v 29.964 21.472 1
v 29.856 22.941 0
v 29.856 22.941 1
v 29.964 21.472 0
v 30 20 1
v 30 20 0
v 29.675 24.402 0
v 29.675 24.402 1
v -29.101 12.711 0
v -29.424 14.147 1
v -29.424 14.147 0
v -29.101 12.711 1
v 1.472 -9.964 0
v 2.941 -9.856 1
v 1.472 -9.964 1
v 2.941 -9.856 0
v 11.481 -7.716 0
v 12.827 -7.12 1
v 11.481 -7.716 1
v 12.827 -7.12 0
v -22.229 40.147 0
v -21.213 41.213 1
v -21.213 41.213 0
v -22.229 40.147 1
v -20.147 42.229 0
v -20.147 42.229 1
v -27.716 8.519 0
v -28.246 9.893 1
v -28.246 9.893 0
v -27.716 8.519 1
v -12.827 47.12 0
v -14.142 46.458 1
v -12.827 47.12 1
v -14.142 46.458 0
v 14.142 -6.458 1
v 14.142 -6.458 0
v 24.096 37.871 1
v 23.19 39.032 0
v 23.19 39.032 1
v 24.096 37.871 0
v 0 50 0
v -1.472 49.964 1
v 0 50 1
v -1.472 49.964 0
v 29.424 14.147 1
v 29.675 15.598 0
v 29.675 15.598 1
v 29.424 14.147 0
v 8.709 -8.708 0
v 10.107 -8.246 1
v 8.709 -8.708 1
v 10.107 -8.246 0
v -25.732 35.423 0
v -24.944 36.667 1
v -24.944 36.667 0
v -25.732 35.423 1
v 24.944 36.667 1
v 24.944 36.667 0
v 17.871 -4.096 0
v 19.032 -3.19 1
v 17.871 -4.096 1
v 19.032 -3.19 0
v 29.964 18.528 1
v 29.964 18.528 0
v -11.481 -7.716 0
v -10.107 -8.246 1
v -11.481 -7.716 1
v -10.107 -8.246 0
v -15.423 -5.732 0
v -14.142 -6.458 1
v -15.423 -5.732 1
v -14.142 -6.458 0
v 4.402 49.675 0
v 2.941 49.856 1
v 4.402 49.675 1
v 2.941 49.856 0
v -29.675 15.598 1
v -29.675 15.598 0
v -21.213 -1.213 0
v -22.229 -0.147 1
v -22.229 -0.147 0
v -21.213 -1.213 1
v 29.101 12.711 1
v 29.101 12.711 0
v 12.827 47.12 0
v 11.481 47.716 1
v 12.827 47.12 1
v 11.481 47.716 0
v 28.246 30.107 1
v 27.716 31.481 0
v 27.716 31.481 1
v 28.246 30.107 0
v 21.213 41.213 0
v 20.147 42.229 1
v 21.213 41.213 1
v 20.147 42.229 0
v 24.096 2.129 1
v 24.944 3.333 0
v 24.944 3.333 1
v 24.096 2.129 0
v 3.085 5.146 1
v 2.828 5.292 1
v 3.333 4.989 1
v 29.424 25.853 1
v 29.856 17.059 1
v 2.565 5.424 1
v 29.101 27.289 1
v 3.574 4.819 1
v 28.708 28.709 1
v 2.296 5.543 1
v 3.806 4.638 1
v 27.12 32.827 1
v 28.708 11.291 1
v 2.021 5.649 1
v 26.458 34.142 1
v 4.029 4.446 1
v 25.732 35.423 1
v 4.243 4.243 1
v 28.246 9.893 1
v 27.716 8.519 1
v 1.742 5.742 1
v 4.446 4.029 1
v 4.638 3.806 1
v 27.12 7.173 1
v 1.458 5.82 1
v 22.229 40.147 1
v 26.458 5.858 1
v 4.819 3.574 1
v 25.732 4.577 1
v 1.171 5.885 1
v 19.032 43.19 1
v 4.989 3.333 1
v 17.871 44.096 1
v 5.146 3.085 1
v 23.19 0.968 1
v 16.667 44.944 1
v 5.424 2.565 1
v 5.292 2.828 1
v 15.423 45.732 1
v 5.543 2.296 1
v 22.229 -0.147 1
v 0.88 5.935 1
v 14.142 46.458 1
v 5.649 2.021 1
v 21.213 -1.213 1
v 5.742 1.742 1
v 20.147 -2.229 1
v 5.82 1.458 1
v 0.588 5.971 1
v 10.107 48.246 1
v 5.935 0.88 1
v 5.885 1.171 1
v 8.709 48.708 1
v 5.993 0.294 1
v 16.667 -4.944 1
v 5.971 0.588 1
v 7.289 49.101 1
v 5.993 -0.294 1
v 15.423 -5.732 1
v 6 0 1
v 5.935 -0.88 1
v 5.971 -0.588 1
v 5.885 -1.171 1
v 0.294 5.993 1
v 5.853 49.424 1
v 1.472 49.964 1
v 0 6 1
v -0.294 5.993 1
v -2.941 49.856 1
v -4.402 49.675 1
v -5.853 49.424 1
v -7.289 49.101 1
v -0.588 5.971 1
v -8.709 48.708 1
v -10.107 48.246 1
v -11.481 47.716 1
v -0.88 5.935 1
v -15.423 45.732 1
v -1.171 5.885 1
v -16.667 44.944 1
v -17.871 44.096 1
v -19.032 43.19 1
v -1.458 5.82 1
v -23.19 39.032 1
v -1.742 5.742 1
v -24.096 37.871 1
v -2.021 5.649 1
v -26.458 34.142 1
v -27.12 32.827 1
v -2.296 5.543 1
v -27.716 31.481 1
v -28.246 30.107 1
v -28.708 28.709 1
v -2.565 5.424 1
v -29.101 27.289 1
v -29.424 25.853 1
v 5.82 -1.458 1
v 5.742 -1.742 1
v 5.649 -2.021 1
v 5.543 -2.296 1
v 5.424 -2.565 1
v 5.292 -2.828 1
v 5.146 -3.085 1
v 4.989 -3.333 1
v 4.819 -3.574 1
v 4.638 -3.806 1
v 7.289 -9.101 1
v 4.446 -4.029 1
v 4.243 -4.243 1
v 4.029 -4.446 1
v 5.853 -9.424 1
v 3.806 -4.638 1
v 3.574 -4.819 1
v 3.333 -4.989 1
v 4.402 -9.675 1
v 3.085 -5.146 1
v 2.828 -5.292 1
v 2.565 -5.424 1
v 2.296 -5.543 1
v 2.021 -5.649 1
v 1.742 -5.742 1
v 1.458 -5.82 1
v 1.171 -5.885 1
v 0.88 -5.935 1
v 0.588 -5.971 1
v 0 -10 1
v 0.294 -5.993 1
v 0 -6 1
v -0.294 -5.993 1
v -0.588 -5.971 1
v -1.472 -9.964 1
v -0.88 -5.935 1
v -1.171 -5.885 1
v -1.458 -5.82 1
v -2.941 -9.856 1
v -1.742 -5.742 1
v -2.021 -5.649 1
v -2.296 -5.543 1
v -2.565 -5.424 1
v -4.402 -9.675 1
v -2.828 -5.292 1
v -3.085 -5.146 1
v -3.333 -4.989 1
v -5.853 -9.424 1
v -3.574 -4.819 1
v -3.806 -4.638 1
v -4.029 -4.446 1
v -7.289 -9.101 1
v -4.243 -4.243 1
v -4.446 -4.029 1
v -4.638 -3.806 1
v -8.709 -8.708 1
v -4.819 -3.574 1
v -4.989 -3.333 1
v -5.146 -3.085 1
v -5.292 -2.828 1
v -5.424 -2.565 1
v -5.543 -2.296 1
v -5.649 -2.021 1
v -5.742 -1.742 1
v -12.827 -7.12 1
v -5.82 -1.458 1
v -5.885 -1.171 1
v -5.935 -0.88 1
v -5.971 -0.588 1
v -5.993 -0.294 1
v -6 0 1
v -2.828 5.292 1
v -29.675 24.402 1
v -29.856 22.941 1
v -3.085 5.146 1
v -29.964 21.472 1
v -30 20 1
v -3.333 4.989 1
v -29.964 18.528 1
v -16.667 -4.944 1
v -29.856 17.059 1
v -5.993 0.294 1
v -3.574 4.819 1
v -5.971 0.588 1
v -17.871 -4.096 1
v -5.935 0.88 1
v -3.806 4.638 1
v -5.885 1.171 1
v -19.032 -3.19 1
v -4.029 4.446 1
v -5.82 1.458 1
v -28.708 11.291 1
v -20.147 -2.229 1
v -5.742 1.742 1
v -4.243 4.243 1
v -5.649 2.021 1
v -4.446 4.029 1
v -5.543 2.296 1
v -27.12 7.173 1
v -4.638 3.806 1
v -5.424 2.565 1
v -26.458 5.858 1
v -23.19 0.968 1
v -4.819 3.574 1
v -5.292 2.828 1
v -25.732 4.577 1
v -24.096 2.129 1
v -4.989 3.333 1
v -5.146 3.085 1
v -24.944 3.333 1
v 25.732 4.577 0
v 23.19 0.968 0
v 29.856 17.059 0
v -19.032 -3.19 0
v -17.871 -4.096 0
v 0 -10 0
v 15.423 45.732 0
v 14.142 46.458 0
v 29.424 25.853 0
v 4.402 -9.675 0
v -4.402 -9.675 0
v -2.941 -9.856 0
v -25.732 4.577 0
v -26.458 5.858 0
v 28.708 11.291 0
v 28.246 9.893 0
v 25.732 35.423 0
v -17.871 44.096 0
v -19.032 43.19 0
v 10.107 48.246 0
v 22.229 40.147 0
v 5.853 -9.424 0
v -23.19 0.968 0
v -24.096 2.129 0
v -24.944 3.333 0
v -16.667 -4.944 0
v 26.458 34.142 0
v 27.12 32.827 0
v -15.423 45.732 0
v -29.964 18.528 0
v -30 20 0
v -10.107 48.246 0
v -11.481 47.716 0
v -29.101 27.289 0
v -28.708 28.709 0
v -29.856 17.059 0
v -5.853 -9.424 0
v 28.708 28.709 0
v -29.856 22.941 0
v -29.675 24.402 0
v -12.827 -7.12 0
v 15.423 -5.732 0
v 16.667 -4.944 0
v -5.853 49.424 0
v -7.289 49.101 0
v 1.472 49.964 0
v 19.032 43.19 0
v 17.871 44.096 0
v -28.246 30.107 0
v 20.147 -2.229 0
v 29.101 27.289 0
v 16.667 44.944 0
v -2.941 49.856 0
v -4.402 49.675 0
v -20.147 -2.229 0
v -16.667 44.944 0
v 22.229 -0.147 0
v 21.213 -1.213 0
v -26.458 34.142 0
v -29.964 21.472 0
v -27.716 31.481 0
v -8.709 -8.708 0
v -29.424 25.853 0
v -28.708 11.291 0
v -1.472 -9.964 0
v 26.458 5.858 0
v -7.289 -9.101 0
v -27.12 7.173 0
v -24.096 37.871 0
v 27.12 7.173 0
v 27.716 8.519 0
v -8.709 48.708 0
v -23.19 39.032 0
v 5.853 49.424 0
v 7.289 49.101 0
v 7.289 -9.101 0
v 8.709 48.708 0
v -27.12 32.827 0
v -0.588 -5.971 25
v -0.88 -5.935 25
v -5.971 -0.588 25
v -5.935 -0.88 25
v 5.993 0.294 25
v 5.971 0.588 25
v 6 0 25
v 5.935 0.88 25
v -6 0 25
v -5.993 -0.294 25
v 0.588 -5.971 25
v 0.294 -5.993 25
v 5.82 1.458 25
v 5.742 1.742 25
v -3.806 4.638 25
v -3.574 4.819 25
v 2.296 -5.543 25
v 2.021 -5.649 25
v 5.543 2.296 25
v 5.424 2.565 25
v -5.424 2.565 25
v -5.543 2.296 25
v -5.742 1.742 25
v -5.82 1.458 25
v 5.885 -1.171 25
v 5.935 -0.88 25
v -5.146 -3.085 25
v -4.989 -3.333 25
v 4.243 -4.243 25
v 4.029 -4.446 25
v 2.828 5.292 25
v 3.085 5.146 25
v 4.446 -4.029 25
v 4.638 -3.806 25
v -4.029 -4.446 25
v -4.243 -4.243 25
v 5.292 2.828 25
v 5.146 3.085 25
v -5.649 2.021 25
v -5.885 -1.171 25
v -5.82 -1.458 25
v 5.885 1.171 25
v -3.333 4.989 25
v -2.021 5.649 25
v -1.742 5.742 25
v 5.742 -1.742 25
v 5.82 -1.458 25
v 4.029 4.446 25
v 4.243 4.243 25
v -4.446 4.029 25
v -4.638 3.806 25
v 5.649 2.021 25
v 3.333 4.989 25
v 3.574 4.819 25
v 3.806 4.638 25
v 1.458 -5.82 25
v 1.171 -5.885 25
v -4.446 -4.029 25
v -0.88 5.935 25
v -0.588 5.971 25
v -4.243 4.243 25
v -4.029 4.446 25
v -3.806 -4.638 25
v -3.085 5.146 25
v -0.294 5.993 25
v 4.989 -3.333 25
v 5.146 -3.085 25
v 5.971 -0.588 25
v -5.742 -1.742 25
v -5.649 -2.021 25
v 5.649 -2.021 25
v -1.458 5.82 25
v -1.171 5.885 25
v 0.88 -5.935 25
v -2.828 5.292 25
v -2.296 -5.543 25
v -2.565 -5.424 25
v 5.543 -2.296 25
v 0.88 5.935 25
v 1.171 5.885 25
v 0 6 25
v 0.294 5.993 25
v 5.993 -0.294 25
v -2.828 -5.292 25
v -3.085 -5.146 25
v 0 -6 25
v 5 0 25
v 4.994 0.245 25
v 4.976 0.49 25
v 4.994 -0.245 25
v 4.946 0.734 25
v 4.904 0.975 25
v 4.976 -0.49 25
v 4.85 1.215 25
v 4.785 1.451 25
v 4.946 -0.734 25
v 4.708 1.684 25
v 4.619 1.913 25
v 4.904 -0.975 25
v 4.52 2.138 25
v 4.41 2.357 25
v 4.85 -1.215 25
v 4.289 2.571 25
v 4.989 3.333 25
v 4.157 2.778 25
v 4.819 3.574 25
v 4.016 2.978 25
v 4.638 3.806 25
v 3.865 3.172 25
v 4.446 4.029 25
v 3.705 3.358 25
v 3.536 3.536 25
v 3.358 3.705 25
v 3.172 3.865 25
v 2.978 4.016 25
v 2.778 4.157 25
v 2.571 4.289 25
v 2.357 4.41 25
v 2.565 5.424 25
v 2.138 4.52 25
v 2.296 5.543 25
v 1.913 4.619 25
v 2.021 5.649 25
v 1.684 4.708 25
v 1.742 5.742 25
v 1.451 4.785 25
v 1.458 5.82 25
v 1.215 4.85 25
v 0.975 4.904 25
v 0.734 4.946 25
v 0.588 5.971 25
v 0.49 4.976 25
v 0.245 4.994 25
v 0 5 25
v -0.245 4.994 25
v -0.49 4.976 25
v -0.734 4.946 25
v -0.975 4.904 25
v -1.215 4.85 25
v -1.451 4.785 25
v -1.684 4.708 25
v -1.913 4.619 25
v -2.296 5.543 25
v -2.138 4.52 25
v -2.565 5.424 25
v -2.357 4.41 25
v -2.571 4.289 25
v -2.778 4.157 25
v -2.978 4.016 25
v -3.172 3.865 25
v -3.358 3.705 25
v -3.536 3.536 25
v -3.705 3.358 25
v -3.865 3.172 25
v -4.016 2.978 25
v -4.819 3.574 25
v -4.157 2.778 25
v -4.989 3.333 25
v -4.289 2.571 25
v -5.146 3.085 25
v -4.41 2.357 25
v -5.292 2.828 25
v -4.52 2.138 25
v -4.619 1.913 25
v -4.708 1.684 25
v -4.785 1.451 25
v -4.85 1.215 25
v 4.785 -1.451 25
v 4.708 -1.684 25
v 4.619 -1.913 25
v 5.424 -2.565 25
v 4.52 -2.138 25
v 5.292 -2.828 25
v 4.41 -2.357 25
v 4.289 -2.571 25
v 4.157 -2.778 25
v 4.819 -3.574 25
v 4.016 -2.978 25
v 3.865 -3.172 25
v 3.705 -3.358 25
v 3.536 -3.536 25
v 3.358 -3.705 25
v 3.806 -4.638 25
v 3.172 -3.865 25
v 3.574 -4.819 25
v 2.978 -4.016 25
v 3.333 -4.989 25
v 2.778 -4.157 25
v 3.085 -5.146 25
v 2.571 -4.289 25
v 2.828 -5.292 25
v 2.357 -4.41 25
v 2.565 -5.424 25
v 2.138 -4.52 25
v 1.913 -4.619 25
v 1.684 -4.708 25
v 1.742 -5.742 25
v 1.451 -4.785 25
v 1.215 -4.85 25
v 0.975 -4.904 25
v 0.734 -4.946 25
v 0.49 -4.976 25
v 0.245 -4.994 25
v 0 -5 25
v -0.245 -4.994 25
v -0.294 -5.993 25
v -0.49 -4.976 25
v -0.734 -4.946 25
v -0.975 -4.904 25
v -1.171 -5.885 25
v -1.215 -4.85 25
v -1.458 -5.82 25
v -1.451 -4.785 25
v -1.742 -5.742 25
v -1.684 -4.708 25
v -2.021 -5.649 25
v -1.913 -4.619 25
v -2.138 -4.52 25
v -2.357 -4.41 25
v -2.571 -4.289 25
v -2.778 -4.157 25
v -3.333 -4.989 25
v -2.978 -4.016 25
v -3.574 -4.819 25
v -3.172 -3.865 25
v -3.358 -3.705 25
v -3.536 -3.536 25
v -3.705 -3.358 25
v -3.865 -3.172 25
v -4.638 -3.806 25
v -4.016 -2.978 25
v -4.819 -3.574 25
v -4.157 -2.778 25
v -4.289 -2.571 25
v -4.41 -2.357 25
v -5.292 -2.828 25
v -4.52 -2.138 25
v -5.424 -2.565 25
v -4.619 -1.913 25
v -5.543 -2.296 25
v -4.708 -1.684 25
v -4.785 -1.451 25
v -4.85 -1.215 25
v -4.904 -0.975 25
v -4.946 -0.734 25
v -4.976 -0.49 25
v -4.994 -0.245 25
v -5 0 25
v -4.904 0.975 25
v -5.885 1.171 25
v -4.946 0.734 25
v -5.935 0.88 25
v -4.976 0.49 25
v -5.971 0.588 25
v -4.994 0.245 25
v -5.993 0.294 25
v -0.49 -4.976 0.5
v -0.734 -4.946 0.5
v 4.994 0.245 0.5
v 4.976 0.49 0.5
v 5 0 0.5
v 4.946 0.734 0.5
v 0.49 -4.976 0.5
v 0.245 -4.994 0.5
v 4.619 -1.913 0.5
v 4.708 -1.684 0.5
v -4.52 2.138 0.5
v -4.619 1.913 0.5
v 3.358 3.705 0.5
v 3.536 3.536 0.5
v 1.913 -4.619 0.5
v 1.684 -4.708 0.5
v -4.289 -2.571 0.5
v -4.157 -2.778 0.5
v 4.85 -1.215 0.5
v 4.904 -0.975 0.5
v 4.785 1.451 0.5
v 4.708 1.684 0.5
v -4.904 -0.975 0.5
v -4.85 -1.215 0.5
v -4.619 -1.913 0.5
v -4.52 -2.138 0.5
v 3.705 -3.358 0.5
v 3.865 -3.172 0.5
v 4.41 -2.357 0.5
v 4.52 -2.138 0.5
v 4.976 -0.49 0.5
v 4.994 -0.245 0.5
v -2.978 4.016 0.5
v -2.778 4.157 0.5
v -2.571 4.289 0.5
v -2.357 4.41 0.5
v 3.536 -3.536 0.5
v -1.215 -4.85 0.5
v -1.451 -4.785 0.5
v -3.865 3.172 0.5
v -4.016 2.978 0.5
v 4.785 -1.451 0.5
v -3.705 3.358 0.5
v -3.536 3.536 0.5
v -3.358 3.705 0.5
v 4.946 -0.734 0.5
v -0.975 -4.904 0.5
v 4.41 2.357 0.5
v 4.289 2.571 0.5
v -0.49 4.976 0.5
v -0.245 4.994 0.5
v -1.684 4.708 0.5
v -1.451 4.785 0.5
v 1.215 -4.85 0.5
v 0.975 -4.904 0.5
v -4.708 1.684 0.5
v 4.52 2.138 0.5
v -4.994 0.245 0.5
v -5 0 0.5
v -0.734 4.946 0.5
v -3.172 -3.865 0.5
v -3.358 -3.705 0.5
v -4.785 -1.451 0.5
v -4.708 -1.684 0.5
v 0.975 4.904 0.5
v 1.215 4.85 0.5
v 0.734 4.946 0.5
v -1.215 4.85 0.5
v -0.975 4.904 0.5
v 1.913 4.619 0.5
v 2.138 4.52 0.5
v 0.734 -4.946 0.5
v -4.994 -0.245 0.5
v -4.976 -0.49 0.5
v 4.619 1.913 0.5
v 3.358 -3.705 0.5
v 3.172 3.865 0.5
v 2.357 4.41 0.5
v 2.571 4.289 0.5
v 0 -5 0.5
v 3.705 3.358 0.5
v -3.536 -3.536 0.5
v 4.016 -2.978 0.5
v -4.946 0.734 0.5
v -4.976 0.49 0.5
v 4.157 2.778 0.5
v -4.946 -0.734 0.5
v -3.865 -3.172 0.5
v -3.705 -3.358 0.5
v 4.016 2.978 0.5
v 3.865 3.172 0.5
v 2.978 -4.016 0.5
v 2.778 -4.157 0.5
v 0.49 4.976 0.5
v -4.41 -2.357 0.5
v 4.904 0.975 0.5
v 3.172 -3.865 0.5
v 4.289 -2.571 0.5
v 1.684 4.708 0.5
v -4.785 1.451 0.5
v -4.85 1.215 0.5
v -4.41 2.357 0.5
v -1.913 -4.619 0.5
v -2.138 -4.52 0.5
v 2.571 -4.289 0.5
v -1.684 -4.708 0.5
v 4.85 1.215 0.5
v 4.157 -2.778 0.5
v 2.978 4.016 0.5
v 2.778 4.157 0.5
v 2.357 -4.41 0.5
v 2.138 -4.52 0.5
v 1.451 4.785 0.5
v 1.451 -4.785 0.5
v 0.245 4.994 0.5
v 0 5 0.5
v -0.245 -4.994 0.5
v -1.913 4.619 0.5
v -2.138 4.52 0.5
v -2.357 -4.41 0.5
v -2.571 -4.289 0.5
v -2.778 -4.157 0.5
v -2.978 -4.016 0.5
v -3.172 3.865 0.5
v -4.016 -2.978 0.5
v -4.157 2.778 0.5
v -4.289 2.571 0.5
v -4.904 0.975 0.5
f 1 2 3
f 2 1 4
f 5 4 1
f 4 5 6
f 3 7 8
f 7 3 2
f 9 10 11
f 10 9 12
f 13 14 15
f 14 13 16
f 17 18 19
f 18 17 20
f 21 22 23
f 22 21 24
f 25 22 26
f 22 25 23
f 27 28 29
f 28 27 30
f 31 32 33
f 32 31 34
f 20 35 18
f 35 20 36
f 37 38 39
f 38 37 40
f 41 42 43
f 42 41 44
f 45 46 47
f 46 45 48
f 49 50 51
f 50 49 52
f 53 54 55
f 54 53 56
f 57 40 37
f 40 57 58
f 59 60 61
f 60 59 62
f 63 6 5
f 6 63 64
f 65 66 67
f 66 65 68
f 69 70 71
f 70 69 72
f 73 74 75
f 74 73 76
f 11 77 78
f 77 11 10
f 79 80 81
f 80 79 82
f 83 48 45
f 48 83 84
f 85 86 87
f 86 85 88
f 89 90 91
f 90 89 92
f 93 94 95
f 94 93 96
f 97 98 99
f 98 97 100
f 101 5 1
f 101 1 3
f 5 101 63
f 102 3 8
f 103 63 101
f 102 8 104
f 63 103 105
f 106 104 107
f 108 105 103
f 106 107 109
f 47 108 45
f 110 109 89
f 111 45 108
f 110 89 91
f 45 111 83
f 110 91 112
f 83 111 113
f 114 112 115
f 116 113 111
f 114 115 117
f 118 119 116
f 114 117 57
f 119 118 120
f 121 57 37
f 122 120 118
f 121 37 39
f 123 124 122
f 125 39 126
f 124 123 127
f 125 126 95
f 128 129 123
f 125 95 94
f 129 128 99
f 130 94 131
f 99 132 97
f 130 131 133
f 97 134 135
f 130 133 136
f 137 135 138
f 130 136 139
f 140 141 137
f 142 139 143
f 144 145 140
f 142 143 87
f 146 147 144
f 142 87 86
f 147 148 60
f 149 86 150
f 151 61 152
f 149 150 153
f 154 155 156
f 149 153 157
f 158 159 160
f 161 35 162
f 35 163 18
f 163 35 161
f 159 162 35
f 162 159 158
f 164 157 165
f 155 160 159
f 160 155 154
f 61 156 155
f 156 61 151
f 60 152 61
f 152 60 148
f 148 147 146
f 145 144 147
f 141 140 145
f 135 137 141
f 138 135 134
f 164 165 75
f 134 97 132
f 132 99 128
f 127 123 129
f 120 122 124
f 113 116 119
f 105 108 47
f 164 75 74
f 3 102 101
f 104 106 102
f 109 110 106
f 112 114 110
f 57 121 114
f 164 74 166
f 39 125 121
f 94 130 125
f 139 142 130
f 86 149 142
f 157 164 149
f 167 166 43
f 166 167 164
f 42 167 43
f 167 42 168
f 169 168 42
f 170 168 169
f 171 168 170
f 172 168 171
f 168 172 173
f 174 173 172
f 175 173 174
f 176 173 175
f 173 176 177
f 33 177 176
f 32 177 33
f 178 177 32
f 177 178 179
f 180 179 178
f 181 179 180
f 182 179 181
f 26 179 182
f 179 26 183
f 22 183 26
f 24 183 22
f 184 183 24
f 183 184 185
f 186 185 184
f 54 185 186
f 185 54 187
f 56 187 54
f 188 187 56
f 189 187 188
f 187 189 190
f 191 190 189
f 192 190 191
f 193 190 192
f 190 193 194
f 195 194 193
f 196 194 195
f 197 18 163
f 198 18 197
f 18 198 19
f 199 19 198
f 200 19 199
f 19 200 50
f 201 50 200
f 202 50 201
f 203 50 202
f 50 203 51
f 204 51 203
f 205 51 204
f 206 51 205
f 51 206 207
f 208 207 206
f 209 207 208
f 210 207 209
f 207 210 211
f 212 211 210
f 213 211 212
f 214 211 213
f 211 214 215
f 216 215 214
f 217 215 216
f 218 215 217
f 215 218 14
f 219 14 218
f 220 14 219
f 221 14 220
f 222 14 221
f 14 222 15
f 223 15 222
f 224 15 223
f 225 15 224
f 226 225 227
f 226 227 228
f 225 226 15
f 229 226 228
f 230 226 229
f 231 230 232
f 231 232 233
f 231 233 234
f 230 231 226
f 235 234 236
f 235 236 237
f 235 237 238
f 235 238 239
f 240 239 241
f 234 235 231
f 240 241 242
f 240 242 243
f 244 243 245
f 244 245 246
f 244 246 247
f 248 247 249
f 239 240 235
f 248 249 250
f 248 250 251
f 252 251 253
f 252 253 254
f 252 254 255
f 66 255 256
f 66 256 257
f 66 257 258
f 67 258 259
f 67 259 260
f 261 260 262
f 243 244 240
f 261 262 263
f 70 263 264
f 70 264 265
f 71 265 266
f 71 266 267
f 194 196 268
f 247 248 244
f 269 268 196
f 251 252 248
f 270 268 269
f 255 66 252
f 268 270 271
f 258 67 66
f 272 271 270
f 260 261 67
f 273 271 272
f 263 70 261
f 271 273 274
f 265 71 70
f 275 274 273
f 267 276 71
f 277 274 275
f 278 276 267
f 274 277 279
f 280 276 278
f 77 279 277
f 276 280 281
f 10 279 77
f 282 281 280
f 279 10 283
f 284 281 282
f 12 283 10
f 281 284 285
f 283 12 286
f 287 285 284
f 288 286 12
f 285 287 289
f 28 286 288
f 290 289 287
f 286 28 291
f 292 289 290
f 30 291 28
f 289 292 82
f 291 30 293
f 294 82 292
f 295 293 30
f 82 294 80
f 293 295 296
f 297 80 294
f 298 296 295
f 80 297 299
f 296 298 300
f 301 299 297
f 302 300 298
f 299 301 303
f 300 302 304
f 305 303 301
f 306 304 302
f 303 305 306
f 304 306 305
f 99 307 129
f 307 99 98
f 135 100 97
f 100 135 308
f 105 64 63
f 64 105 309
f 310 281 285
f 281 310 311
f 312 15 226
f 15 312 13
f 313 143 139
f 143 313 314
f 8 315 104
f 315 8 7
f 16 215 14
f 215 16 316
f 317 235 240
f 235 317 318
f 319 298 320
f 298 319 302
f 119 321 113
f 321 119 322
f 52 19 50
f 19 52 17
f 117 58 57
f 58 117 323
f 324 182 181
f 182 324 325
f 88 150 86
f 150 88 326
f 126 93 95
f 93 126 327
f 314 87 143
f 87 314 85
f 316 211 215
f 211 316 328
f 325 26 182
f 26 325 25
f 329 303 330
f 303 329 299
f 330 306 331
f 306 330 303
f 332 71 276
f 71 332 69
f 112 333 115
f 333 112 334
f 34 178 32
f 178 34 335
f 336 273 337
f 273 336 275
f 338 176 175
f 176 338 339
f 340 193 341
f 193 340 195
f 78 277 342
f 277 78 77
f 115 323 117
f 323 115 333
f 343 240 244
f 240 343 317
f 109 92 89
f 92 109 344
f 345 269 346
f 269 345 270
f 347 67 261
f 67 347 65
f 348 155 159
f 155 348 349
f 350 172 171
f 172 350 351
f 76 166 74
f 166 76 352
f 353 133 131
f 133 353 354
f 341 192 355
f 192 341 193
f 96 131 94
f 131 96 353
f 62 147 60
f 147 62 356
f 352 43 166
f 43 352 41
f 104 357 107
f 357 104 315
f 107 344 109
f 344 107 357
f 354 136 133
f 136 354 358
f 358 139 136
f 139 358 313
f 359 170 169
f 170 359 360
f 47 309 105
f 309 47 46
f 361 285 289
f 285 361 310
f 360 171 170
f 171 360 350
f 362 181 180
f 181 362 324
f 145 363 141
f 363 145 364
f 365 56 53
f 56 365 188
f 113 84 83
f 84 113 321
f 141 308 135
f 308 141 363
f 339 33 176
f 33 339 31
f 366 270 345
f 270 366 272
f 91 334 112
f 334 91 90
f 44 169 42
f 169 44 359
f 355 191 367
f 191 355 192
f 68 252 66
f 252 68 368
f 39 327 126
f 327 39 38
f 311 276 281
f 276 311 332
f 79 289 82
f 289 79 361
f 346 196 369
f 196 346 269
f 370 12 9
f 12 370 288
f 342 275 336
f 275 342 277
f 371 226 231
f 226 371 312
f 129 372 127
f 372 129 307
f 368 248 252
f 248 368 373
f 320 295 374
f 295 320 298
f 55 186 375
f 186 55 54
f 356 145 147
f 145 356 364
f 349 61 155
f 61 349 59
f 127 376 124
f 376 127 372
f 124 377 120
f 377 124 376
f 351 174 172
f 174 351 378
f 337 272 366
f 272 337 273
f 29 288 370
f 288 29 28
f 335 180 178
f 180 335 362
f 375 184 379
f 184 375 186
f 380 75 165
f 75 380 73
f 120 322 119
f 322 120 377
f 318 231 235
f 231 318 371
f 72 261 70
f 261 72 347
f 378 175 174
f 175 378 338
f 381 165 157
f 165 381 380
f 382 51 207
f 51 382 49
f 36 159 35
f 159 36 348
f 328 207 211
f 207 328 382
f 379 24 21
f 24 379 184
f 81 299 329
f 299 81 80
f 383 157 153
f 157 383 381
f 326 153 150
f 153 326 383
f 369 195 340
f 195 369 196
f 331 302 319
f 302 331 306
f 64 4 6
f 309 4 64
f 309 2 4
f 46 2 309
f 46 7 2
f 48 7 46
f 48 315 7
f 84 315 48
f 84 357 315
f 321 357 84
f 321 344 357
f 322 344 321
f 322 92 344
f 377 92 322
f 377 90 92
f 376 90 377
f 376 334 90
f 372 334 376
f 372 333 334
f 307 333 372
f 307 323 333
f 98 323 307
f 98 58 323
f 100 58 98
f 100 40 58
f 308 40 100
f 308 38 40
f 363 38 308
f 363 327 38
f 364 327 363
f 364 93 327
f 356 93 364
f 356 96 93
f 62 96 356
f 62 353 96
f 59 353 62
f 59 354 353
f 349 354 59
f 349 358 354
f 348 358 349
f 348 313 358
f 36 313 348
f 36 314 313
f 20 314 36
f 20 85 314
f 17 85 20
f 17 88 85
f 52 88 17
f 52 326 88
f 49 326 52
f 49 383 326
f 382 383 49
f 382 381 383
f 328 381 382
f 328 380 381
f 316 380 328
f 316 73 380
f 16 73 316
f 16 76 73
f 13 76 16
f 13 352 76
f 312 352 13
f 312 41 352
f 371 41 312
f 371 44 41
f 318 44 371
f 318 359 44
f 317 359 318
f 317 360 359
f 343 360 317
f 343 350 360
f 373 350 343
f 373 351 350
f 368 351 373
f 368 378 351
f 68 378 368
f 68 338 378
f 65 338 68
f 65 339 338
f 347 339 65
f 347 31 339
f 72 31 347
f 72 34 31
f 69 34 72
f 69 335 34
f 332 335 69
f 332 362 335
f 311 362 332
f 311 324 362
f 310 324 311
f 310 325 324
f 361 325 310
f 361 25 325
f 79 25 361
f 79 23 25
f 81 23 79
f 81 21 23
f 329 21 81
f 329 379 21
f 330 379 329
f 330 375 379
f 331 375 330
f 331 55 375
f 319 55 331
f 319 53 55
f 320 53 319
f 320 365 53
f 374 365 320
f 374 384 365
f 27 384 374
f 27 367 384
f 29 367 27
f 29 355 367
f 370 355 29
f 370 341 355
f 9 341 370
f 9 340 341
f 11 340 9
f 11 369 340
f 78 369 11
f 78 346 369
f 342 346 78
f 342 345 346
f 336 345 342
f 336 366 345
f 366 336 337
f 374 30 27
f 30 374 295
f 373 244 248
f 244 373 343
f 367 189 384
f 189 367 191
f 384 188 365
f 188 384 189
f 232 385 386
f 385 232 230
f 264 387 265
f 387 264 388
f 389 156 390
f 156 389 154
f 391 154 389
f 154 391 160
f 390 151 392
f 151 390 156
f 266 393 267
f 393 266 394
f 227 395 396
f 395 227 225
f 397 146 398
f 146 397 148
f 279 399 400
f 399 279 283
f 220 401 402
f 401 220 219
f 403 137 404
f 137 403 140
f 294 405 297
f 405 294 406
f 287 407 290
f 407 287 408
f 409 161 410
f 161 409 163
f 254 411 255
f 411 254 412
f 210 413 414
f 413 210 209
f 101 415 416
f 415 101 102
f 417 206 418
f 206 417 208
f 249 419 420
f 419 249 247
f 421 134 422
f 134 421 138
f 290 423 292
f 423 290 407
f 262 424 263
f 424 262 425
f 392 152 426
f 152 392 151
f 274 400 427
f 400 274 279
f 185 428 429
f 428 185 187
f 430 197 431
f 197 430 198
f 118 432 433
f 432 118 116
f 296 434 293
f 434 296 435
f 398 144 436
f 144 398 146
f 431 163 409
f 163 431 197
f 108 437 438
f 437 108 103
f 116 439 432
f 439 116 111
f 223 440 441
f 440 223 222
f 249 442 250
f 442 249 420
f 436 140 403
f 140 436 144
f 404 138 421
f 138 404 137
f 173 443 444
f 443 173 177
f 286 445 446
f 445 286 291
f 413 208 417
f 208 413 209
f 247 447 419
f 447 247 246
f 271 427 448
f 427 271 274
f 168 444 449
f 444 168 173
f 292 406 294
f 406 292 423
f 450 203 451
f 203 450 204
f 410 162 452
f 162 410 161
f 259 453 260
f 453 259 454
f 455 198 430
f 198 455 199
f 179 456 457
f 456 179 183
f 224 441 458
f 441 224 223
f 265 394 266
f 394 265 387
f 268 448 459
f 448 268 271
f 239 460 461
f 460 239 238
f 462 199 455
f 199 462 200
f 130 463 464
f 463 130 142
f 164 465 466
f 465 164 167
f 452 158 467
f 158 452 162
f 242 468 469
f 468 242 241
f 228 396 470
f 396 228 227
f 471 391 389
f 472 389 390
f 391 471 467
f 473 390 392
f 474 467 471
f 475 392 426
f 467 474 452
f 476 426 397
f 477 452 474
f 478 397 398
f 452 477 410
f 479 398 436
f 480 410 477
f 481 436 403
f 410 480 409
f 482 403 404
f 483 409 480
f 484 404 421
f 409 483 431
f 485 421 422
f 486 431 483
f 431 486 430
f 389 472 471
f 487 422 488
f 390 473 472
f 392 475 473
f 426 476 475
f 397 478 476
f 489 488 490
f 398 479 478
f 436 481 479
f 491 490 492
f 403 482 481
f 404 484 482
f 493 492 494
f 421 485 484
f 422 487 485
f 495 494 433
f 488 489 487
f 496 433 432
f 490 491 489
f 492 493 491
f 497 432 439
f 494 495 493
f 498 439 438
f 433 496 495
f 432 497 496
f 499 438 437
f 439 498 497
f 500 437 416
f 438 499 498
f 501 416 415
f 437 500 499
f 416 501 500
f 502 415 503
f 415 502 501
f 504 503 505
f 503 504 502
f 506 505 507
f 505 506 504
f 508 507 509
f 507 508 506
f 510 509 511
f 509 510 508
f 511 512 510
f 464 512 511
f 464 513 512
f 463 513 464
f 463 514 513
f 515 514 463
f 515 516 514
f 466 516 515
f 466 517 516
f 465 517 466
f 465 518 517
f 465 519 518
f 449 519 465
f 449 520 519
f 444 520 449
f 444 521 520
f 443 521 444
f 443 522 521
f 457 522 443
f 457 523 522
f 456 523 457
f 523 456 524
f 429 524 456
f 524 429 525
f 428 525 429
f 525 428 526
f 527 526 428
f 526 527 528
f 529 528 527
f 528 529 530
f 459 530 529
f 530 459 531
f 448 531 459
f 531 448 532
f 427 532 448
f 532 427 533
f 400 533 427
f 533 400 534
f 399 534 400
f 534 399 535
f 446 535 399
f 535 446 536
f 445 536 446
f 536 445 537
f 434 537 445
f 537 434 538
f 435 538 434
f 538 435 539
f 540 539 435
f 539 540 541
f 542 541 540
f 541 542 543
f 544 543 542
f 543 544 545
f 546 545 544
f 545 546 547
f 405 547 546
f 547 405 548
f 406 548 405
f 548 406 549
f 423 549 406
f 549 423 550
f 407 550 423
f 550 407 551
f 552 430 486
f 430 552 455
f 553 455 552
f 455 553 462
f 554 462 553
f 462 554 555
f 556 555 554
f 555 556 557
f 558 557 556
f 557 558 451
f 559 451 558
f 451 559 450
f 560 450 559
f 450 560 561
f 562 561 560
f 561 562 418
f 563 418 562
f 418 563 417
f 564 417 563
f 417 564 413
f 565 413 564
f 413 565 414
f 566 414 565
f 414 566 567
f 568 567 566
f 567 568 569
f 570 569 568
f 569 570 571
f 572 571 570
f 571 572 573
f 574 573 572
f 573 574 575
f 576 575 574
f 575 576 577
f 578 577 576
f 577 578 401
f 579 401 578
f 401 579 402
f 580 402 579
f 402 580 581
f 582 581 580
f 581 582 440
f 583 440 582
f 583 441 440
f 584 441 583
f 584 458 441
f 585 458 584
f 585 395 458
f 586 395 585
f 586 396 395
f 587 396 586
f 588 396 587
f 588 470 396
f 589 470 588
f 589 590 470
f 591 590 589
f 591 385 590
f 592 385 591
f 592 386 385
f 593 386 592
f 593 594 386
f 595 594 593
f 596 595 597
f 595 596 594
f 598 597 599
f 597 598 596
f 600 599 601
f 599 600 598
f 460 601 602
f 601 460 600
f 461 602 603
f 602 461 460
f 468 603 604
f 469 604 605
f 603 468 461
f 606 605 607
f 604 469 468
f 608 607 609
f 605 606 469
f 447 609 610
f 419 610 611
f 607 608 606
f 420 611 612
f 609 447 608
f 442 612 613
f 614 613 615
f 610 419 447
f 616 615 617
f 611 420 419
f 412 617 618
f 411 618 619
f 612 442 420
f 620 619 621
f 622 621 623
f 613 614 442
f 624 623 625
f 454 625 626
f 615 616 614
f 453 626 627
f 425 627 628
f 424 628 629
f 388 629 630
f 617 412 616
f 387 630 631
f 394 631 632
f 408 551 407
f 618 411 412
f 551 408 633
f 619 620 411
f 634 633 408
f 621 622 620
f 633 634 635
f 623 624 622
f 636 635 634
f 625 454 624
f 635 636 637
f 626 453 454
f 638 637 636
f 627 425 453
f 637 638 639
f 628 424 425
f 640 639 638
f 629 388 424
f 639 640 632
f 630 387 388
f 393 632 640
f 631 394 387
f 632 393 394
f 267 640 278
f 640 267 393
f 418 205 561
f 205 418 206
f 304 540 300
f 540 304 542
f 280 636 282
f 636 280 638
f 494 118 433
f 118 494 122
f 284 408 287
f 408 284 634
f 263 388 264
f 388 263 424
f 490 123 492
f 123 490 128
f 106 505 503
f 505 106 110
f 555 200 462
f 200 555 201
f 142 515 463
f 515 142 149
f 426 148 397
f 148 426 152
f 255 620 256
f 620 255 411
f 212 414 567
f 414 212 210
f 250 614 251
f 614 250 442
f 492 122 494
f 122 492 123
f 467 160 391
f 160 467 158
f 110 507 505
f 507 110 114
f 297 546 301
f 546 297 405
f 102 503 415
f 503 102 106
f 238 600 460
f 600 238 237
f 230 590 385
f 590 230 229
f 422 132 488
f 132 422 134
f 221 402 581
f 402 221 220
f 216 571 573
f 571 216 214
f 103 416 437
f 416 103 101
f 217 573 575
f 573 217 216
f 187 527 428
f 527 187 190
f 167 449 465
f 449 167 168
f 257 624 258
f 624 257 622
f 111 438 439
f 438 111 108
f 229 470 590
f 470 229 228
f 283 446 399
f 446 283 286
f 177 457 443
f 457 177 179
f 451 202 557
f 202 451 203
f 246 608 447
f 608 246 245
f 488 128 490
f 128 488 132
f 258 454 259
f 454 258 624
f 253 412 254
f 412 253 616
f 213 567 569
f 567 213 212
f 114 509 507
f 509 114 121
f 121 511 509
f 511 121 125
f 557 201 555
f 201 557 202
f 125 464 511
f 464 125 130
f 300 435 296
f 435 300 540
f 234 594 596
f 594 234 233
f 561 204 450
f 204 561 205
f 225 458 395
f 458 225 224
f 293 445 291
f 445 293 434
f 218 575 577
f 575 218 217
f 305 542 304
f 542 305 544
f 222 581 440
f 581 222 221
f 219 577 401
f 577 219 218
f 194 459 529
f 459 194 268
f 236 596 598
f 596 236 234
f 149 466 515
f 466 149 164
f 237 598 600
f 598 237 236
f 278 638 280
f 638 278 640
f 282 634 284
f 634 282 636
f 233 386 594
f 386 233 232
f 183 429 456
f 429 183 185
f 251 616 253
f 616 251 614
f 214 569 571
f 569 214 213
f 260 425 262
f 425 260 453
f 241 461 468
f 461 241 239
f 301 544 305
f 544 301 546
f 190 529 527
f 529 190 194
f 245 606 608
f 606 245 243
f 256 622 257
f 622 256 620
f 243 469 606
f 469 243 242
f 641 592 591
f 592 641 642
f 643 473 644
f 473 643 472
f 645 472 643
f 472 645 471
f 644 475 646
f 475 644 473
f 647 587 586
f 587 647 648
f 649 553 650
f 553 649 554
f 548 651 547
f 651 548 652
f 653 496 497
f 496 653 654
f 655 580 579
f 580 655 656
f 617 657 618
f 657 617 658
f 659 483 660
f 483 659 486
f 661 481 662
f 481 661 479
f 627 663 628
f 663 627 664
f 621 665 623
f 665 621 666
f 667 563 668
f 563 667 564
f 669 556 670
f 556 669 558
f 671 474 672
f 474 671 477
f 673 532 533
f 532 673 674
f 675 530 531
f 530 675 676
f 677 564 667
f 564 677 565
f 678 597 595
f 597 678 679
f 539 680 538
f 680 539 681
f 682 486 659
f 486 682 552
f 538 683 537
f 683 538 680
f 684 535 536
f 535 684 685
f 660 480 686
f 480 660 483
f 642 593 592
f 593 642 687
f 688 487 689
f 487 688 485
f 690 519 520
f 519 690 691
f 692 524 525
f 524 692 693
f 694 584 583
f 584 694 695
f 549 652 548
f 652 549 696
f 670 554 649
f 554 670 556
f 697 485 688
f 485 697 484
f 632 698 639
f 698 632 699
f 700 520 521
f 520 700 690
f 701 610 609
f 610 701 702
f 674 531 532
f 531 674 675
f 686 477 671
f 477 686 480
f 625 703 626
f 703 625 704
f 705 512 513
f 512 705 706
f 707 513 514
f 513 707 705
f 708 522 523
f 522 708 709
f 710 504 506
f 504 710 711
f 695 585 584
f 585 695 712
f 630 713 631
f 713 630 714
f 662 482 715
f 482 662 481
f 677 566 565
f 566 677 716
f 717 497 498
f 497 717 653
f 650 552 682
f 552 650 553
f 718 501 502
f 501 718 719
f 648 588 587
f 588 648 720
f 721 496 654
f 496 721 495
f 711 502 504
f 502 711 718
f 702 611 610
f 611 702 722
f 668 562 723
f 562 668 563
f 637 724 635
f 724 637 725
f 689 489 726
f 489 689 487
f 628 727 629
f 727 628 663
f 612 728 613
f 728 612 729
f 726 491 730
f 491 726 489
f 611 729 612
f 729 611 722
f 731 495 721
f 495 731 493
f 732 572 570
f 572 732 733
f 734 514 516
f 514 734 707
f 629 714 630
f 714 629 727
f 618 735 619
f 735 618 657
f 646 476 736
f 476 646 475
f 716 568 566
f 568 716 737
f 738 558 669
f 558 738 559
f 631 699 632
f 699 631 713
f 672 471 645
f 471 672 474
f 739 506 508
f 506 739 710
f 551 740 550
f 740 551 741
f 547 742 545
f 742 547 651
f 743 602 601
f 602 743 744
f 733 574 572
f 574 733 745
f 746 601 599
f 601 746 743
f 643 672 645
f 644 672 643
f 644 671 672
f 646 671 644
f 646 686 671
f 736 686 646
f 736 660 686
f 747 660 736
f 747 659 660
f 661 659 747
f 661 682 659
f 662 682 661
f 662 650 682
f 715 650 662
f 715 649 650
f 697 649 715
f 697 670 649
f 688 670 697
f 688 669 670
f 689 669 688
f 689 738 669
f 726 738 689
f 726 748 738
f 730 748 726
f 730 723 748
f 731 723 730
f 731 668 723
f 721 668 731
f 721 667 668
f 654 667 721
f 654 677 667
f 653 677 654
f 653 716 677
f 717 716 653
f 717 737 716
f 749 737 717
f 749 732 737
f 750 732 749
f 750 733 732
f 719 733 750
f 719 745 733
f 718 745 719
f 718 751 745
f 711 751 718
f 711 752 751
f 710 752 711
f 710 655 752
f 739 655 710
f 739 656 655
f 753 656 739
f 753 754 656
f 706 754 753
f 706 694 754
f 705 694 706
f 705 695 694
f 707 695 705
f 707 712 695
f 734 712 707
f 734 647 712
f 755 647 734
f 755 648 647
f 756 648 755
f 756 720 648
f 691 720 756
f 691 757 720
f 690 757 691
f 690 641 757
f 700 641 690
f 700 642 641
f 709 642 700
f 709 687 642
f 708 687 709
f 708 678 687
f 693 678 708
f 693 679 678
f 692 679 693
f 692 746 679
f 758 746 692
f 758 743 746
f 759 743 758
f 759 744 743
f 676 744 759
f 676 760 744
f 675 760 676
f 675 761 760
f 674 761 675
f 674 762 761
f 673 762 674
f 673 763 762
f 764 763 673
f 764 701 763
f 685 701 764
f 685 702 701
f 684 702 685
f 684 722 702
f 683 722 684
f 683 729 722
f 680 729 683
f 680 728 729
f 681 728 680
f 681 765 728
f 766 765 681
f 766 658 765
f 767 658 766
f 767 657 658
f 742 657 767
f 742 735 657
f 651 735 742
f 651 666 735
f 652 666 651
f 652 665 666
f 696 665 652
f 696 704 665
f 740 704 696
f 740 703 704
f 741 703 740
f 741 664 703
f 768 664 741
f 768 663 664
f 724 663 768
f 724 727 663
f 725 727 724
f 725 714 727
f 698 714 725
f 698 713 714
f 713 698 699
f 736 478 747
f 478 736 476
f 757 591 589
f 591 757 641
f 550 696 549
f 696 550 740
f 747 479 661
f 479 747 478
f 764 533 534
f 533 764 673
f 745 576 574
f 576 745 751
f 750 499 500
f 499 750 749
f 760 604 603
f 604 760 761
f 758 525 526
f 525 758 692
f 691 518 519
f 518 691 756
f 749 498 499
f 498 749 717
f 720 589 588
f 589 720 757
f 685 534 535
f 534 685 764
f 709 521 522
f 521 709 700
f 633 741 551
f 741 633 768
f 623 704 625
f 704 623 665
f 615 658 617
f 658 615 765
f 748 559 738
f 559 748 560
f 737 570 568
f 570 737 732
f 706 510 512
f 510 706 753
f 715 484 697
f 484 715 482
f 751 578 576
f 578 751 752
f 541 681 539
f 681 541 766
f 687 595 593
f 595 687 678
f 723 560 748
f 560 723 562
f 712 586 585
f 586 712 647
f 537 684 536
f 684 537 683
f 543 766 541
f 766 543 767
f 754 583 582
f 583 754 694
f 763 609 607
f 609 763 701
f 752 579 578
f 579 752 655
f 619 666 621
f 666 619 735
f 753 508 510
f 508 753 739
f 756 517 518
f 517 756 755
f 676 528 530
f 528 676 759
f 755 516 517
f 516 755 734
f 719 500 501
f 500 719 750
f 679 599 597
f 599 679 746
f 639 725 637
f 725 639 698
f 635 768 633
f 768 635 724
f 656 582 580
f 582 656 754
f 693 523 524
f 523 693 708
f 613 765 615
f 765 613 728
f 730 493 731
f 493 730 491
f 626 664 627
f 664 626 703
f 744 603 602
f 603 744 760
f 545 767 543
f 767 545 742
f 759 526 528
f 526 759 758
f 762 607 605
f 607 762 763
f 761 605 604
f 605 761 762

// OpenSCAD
$fn = 128;

difference() {
    union() {
        translate([0,20,0])
        cylinder(h = 1, d = 60);
        cylinder(h = 25, d = 12);
    }
    translate([0, 0, 25 - 24.5])
        cylinder(h = 24.5 + 0.01, d = 10);
}
